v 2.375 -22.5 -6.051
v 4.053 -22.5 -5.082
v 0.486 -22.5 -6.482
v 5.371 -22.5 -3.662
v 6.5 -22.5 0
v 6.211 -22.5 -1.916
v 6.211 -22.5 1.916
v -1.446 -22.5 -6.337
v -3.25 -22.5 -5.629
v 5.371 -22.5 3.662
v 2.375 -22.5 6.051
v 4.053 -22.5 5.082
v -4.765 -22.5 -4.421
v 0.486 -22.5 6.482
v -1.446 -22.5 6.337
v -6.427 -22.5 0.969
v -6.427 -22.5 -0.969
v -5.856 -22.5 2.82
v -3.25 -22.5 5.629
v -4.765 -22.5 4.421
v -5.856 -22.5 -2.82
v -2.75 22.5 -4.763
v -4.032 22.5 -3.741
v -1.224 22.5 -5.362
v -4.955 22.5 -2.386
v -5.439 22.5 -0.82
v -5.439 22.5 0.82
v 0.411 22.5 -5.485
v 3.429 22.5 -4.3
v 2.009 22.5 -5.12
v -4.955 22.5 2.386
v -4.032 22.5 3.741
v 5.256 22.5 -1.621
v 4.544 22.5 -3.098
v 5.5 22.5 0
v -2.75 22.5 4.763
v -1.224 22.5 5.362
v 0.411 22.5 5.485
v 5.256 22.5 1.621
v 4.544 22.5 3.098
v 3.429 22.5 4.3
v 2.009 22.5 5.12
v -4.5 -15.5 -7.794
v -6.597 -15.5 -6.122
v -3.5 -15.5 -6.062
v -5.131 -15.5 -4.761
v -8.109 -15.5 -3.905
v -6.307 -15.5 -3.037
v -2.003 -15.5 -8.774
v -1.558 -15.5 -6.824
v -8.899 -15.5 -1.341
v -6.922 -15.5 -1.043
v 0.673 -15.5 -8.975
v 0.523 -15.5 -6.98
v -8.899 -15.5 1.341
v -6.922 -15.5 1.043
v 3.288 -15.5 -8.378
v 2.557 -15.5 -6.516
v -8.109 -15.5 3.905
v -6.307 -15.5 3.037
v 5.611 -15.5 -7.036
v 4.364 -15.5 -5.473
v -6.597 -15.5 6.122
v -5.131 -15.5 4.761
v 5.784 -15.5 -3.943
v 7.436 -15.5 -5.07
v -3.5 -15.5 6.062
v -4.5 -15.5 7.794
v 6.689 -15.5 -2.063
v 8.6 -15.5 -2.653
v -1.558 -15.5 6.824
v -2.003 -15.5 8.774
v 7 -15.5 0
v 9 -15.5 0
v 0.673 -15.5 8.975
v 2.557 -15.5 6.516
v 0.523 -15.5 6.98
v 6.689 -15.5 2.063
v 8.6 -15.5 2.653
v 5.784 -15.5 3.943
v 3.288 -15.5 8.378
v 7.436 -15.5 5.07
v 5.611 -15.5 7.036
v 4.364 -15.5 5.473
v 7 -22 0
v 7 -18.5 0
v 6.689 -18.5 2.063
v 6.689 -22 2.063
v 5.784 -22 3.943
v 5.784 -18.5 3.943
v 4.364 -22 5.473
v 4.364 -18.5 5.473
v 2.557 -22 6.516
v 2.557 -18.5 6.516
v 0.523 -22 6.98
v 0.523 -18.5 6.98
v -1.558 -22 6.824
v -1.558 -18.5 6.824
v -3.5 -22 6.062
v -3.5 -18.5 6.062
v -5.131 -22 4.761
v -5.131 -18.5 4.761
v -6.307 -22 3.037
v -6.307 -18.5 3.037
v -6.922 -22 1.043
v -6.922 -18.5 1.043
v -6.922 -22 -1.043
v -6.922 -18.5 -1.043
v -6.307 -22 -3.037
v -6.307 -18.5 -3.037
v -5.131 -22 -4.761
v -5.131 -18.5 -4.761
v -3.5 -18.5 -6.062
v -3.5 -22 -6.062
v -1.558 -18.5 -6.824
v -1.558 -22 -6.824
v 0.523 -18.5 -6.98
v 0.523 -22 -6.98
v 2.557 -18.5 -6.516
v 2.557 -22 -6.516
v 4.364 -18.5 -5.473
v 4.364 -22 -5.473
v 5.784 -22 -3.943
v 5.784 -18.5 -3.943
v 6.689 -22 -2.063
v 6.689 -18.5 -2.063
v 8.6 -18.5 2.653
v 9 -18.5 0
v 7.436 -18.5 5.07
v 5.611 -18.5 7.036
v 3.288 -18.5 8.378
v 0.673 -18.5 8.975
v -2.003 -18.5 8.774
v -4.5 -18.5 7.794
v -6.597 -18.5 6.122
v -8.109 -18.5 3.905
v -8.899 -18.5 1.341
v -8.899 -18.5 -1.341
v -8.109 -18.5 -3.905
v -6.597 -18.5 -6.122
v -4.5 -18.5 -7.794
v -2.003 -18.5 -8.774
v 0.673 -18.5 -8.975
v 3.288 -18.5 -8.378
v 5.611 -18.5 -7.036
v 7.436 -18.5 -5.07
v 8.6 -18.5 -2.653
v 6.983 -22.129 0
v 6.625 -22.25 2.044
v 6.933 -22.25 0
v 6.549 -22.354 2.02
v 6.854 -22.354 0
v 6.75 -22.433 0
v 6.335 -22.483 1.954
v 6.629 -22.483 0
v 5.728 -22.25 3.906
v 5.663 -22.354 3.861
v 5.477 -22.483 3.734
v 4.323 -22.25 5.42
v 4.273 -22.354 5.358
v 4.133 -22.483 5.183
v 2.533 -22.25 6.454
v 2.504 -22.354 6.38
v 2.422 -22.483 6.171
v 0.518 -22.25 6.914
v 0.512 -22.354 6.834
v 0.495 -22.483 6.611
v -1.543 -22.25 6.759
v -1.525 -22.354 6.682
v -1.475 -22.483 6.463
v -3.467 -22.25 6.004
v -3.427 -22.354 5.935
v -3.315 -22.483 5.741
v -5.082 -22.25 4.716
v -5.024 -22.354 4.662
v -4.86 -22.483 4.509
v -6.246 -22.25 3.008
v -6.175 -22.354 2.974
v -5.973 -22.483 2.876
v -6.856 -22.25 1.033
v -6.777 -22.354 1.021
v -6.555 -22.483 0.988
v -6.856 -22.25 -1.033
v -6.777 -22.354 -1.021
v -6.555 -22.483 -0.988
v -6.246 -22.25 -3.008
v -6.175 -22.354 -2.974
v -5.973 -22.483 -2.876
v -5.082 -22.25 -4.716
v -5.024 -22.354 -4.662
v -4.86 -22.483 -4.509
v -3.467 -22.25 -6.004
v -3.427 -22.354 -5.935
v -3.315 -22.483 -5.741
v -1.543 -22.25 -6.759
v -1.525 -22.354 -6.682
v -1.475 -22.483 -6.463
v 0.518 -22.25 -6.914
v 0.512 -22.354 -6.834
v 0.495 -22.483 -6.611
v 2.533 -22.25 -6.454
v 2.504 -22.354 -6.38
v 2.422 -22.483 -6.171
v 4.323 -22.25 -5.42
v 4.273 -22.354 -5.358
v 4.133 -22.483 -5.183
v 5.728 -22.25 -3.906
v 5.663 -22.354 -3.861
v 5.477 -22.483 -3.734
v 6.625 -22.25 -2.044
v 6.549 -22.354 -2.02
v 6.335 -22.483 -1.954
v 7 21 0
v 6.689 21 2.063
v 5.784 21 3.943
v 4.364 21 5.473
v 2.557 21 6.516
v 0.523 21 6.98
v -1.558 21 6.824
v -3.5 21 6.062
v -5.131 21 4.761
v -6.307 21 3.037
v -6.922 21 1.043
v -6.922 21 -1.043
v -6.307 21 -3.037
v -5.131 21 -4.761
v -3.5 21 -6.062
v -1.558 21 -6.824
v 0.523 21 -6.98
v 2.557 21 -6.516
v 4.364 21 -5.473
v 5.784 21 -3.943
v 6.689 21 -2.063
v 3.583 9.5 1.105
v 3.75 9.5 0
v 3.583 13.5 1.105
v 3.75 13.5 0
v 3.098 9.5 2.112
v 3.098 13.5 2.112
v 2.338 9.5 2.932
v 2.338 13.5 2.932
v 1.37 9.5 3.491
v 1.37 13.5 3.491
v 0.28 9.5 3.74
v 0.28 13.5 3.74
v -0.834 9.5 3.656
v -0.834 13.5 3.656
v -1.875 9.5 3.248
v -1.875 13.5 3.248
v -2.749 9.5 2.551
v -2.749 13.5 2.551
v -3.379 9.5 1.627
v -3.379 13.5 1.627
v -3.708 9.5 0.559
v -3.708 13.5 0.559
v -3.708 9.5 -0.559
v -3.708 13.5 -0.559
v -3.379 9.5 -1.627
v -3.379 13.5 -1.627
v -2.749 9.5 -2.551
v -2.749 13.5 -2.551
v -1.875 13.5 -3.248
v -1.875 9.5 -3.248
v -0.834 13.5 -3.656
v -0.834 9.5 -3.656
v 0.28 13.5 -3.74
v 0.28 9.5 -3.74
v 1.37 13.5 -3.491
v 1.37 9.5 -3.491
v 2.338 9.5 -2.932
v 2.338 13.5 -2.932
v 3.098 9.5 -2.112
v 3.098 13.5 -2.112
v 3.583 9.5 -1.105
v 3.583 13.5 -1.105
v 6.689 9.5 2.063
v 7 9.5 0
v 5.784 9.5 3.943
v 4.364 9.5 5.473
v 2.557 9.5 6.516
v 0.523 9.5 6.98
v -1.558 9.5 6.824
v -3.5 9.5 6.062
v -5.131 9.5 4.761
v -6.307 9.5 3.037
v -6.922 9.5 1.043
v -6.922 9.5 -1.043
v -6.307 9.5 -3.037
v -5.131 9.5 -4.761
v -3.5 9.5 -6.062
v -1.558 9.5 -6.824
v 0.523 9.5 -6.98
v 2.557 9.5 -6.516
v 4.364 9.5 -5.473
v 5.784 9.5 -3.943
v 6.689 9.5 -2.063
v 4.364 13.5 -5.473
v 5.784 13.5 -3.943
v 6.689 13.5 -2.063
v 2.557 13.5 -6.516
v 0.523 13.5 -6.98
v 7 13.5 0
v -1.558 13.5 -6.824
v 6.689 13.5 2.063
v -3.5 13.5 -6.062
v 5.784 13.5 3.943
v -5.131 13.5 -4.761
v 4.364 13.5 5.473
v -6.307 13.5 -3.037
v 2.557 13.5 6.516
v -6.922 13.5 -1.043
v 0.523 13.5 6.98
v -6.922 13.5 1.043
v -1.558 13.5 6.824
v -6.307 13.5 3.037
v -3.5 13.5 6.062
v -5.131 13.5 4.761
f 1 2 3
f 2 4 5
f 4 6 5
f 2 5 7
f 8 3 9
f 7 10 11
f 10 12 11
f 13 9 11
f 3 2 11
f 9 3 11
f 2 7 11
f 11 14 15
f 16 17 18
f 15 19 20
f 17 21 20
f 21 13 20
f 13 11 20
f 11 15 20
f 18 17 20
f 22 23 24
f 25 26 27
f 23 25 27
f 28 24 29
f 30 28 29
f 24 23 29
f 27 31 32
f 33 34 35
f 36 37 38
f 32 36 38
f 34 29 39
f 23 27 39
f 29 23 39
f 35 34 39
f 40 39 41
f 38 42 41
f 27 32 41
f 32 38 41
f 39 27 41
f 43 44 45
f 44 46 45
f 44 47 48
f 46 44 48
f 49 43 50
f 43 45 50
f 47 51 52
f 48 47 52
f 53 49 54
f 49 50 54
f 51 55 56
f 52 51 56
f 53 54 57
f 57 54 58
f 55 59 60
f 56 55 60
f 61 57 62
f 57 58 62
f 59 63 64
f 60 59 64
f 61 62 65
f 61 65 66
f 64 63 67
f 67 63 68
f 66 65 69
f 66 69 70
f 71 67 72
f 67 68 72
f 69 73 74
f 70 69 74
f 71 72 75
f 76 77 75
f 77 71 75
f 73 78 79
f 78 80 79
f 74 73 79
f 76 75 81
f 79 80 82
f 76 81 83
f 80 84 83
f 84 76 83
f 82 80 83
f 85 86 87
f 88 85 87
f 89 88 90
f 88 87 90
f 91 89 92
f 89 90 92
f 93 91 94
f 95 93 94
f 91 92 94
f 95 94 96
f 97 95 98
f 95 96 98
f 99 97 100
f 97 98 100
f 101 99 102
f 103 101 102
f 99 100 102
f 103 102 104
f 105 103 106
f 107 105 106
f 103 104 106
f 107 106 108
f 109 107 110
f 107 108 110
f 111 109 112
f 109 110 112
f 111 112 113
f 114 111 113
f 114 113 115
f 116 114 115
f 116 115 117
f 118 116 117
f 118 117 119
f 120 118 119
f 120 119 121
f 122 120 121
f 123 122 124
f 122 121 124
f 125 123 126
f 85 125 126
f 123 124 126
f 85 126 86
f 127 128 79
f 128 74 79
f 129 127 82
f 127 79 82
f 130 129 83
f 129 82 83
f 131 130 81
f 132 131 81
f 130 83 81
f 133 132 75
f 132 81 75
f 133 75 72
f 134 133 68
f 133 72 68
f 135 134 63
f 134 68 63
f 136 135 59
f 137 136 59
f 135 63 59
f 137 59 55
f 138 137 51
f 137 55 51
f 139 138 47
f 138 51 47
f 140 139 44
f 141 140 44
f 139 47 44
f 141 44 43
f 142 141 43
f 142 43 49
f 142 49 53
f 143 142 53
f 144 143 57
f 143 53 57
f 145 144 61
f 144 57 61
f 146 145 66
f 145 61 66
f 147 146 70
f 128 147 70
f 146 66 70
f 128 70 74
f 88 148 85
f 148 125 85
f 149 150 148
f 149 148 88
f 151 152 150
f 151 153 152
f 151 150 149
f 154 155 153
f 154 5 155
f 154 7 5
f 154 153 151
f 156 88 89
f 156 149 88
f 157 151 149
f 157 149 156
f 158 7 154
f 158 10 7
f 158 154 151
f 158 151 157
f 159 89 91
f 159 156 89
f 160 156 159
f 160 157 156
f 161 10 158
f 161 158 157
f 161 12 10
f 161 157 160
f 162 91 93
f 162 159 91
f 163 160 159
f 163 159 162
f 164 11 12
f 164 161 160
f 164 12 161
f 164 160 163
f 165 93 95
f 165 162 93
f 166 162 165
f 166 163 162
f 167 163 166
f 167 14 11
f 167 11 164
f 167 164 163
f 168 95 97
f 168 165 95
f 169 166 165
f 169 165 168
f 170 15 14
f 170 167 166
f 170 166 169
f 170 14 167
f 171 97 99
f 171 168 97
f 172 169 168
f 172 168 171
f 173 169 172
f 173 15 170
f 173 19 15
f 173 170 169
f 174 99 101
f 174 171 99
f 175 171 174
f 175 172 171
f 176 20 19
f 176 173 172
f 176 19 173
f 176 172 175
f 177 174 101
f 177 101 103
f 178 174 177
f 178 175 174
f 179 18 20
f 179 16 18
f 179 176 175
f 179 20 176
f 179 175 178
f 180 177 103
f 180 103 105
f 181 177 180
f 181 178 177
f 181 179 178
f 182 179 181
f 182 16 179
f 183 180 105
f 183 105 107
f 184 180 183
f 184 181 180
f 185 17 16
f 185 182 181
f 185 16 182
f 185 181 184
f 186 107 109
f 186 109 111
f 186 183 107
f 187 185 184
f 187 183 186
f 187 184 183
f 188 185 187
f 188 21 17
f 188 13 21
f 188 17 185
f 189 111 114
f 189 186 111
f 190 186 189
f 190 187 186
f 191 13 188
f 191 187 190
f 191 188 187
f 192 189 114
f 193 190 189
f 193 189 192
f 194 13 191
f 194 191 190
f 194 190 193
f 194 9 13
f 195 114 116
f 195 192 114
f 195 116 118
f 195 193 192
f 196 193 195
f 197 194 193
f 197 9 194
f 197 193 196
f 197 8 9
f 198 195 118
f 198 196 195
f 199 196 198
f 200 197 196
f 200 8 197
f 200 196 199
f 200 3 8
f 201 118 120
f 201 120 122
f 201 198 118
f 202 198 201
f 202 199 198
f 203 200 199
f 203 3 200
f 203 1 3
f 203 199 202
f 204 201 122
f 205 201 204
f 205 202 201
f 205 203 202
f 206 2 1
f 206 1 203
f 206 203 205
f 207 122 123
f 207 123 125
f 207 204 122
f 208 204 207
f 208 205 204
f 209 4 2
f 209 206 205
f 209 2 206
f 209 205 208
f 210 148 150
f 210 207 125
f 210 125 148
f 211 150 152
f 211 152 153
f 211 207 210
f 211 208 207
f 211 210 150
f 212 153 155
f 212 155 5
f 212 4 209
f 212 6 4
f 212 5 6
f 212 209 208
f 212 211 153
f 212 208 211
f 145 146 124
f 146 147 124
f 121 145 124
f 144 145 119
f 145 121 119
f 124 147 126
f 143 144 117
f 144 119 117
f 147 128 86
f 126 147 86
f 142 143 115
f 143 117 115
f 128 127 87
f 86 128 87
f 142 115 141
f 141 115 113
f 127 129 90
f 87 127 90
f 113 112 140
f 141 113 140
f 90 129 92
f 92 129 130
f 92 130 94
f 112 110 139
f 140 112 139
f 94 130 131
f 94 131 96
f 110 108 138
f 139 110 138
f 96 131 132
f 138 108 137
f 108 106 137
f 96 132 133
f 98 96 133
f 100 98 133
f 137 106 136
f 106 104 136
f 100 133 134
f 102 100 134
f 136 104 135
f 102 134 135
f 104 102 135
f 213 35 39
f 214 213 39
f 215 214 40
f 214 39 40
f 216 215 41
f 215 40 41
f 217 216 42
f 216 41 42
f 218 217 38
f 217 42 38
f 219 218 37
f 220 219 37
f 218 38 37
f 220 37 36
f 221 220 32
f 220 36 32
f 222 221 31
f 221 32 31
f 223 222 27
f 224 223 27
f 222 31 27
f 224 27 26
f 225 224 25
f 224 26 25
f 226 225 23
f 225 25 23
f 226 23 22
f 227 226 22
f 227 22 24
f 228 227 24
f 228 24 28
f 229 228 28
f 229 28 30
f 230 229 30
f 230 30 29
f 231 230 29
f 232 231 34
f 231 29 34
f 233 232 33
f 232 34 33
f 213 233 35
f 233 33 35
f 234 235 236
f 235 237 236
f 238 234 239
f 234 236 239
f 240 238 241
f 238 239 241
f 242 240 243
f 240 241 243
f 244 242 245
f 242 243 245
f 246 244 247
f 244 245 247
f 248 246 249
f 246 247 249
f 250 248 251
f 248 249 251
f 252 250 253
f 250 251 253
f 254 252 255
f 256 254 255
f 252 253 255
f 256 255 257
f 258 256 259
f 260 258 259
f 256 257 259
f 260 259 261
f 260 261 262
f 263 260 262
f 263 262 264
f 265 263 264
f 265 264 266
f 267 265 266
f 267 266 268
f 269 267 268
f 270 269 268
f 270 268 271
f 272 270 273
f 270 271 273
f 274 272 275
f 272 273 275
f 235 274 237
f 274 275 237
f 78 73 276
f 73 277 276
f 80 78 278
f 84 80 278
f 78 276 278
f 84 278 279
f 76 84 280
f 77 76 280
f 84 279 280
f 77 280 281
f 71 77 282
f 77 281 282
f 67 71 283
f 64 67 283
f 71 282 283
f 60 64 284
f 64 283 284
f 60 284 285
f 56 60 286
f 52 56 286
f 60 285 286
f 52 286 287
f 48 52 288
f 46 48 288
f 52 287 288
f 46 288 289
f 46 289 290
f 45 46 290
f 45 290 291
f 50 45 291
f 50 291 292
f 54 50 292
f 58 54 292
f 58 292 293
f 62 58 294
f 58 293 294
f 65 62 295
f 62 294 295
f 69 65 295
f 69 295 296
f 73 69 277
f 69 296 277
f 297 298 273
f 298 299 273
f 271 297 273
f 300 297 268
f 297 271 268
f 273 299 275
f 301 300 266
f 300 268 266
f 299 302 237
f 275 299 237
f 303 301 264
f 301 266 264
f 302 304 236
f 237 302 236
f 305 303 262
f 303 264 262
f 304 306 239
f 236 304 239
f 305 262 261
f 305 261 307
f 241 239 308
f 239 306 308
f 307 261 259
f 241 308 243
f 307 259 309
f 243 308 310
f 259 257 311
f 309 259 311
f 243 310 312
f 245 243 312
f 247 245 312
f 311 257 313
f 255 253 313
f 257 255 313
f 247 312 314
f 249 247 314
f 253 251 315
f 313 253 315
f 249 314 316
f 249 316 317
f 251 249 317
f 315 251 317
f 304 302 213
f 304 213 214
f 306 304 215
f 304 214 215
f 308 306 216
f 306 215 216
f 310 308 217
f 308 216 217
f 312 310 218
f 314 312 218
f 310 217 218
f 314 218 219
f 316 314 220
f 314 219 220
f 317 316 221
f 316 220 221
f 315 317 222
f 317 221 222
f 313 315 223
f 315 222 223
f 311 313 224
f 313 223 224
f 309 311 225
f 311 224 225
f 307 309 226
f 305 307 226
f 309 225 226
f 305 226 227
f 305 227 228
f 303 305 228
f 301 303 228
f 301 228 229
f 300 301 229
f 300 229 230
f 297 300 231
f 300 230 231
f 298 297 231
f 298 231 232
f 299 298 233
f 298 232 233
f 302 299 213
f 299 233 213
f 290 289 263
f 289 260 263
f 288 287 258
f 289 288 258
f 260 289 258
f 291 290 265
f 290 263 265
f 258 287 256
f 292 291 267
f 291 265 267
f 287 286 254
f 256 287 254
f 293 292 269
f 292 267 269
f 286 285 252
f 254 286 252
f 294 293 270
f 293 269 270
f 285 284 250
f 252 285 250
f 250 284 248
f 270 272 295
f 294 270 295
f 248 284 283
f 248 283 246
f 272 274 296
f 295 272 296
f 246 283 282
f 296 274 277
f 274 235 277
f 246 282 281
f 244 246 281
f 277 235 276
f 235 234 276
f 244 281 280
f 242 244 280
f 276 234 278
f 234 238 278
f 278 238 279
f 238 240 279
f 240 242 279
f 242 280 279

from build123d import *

# Parameters (mm, degrees)
CHAFL_N1_SIZE = 1.5
REDONDEO1_R   = 0.5


with BuildPart() as part:
    # Croquis1 → Revolución1 (revolve)
    with BuildSketch(Plane.XY):
        Polygon((0, -22.5), (7, -22.5), (7, -18.5), (9, -18.5), (9, -15.5), (7, -15.5), (7, 9.5), (3.75, 9.5), (3.75, 13.5), (7, 13.5), (7, 22.5), (0, 22.5), align=None)
    revolve(axis=Axis((0, 22.5, 0), (0, -1, 0)))

    # Chaflán1
    chafl_n1_edges = [part.edges().sort_by_distance(p)[0] for p in [
        (-7, 22.5, 0),
    ]]
    chamfer(chafl_n1_edges, length=CHAFL_N1_SIZE)

    # Redondeo1
    redondeo1_edges = [part.edges().sort_by_distance(p)[0] for p in [
        (-7, -22.5, 0),
    ]]
    fillet(redondeo1_edges, radius=REDONDEO1_R)


solid = part.part
